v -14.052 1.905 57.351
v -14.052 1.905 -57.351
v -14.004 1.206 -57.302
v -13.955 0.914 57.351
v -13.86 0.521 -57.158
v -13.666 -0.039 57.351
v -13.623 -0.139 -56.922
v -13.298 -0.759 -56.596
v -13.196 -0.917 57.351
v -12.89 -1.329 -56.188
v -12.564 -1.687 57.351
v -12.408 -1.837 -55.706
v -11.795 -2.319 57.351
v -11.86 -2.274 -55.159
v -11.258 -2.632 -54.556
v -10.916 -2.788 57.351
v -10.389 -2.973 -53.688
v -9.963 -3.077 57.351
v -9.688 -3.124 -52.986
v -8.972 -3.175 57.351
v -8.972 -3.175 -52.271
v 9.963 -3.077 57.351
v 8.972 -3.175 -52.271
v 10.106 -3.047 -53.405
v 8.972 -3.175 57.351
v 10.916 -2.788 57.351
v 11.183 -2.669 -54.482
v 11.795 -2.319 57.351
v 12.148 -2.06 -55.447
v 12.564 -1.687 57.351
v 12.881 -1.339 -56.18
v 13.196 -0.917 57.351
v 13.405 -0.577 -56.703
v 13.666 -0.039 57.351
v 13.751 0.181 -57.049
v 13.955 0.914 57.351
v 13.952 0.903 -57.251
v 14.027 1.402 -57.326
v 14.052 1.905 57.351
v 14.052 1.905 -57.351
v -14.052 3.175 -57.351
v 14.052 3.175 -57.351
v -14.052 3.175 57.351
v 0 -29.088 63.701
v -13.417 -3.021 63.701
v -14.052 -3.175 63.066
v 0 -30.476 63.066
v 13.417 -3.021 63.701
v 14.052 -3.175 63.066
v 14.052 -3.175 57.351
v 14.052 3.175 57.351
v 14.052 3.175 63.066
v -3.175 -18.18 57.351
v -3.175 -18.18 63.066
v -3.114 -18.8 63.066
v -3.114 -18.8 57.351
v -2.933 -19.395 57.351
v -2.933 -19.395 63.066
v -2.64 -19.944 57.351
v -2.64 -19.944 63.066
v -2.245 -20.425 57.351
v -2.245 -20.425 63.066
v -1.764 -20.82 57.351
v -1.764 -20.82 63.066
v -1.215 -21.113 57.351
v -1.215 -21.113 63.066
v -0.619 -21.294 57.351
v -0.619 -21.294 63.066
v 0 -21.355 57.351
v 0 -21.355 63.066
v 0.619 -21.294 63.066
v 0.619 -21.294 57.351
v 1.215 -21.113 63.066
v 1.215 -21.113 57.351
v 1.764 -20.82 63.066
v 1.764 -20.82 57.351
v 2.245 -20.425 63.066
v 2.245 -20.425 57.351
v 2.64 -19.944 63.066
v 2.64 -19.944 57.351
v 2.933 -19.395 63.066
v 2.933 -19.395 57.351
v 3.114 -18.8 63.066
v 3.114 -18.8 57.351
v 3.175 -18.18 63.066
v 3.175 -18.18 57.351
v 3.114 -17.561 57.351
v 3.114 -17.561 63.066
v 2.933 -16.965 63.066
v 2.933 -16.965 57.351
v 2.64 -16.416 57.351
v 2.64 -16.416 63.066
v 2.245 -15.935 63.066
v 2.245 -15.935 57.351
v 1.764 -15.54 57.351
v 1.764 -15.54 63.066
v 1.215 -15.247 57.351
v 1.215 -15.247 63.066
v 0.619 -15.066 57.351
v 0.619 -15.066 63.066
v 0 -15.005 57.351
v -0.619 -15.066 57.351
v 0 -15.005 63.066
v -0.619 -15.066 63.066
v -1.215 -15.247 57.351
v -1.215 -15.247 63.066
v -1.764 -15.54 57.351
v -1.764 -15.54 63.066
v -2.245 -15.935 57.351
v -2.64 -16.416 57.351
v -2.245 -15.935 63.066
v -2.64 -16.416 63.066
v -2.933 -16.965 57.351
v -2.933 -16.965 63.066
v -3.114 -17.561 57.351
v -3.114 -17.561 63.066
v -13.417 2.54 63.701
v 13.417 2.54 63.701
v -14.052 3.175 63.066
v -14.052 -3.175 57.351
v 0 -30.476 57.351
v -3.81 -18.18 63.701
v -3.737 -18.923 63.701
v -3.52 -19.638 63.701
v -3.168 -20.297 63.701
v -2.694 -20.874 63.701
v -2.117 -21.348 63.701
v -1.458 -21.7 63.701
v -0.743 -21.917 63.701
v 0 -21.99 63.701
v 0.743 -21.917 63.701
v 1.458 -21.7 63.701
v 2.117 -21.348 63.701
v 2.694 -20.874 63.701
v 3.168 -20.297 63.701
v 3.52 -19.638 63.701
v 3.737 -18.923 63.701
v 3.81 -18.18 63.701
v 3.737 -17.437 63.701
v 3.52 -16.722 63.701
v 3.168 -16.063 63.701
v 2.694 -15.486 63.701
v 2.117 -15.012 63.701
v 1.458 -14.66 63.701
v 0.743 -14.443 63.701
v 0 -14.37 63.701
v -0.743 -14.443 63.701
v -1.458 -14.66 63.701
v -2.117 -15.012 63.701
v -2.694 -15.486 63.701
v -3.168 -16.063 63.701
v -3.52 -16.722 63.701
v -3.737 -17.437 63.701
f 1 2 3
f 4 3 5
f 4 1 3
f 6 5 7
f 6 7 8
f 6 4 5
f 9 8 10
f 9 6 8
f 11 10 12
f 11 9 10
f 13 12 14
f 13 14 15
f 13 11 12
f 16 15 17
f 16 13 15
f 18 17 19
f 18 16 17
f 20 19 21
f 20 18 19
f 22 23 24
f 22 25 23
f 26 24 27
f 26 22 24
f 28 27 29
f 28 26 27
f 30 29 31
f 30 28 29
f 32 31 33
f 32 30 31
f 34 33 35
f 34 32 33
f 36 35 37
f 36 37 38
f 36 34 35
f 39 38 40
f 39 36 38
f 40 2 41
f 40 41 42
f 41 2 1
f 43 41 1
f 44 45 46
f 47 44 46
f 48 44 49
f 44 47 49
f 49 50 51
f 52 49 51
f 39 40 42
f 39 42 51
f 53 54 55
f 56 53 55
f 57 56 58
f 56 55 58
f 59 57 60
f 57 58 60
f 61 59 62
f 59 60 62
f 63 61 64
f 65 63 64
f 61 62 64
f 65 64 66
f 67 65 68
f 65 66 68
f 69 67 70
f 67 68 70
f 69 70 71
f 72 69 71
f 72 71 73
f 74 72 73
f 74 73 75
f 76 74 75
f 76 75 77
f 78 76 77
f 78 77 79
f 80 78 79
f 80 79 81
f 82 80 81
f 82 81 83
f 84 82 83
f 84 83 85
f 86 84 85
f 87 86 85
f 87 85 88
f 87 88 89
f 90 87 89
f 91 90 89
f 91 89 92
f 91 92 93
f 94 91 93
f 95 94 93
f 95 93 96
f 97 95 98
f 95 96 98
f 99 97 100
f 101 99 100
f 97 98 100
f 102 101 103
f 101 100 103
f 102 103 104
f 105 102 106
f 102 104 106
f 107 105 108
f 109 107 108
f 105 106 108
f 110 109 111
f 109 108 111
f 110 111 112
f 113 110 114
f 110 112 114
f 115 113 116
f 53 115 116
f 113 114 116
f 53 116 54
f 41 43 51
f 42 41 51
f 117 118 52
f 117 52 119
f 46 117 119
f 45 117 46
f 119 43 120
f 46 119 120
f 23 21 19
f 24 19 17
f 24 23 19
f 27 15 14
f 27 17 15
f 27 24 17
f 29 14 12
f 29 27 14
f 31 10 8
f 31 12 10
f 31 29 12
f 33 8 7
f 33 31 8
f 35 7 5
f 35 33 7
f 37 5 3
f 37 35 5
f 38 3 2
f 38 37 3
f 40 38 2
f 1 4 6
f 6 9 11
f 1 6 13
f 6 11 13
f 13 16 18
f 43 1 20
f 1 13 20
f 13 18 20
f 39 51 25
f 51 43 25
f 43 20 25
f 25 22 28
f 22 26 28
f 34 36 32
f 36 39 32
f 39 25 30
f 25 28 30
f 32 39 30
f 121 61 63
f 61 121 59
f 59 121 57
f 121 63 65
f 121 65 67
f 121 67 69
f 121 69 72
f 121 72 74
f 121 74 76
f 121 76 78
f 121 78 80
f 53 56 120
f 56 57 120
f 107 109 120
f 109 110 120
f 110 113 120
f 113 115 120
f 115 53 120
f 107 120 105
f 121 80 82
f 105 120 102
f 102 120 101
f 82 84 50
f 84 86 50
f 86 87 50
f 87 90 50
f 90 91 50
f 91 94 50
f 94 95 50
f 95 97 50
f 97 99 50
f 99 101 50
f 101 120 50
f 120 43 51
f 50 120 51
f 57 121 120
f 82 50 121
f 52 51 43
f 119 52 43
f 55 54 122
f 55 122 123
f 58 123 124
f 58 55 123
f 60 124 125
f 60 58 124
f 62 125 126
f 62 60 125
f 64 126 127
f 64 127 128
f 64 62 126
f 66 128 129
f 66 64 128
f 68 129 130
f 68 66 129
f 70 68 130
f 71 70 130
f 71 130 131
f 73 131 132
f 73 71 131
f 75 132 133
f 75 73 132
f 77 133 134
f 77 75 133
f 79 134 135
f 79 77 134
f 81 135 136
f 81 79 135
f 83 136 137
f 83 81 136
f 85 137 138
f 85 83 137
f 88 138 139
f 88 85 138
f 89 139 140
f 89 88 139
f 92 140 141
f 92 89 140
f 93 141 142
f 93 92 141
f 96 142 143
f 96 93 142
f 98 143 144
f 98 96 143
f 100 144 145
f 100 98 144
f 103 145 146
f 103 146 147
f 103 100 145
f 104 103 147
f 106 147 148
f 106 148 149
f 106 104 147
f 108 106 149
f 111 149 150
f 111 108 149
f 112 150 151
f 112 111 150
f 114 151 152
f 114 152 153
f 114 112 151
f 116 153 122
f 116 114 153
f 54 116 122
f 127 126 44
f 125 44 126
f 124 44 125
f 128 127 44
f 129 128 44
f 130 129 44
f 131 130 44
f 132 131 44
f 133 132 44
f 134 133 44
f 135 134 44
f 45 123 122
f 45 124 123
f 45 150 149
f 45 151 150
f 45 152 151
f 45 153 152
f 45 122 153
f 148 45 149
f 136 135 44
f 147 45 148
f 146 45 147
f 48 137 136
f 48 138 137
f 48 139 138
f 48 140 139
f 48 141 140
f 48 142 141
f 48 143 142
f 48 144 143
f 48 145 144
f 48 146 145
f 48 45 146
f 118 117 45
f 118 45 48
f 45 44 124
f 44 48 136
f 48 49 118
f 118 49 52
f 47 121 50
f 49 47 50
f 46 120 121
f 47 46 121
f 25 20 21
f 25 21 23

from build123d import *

# Parameters (mm, degrees)
F0_W     = 28.1045008451
F0_H     = 114.7014945745
F1_DEPTH = 3.175
F3_DEPTH = 6.35
F4_D     = 6.35
F5_SIZE  = 0.635
F6_R     = 5.08


with BuildPart() as f1:
    # F0 (on Front) → F1 (new body, symmetric)
    with BuildSketch(Plane.XZ):
        Rectangle(F0_W, F0_H)
    extrude(amount=F1_DEPTH, both=True)

    # F6
    f6_edges = [f1.edges().sort_by_distance(p)[0] for p in [
        (-14.05225, -3.175, 0),
        (0, -3.175, -57.350747),
        (14.05225, -3.175, 0),
    ]]
    fillet(f6_edges, radius=F6_R)


with BuildPart() as f3:
    # F2 (on face) → F3 (new body)
    with BuildSketch(Plane.XY.offset(57.3507472873)):
        Polygon((-14.0522504225, 3.175), (-14.0522504225, -3.175), (0, -30.4758194834), (14.0522504225, -3.175), (14.0522504225, 3.175), align=None)
    extrude(amount=F3_DEPTH)

    # F4 (through all)
    with Locations(Plane(origin=(0, 0, 57.3507472873), x_dir=(1, 0, 0), z_dir=(0, 0, -1))):
        with Locations((0, 18.1800983846)):
            Hole(F4_D / 2)

    # F5
    f5_edges = [f3.edges().sort_by_distance(p)[0] for p in [
        (-14.05225, 0, 63.700747),
        (0, 3.175, 63.700747),
        (-7.026125, -16.82541, 63.700747),
        (14.05225, 0, 63.700747),
        (7.026125, -16.82541, 63.700747),
        (-3.175, -18.180098, 63.700747),
    ]]
    chamfer(f5_edges, length=F5_SIZE)


solid = Compound([f1.part, f3.part])
